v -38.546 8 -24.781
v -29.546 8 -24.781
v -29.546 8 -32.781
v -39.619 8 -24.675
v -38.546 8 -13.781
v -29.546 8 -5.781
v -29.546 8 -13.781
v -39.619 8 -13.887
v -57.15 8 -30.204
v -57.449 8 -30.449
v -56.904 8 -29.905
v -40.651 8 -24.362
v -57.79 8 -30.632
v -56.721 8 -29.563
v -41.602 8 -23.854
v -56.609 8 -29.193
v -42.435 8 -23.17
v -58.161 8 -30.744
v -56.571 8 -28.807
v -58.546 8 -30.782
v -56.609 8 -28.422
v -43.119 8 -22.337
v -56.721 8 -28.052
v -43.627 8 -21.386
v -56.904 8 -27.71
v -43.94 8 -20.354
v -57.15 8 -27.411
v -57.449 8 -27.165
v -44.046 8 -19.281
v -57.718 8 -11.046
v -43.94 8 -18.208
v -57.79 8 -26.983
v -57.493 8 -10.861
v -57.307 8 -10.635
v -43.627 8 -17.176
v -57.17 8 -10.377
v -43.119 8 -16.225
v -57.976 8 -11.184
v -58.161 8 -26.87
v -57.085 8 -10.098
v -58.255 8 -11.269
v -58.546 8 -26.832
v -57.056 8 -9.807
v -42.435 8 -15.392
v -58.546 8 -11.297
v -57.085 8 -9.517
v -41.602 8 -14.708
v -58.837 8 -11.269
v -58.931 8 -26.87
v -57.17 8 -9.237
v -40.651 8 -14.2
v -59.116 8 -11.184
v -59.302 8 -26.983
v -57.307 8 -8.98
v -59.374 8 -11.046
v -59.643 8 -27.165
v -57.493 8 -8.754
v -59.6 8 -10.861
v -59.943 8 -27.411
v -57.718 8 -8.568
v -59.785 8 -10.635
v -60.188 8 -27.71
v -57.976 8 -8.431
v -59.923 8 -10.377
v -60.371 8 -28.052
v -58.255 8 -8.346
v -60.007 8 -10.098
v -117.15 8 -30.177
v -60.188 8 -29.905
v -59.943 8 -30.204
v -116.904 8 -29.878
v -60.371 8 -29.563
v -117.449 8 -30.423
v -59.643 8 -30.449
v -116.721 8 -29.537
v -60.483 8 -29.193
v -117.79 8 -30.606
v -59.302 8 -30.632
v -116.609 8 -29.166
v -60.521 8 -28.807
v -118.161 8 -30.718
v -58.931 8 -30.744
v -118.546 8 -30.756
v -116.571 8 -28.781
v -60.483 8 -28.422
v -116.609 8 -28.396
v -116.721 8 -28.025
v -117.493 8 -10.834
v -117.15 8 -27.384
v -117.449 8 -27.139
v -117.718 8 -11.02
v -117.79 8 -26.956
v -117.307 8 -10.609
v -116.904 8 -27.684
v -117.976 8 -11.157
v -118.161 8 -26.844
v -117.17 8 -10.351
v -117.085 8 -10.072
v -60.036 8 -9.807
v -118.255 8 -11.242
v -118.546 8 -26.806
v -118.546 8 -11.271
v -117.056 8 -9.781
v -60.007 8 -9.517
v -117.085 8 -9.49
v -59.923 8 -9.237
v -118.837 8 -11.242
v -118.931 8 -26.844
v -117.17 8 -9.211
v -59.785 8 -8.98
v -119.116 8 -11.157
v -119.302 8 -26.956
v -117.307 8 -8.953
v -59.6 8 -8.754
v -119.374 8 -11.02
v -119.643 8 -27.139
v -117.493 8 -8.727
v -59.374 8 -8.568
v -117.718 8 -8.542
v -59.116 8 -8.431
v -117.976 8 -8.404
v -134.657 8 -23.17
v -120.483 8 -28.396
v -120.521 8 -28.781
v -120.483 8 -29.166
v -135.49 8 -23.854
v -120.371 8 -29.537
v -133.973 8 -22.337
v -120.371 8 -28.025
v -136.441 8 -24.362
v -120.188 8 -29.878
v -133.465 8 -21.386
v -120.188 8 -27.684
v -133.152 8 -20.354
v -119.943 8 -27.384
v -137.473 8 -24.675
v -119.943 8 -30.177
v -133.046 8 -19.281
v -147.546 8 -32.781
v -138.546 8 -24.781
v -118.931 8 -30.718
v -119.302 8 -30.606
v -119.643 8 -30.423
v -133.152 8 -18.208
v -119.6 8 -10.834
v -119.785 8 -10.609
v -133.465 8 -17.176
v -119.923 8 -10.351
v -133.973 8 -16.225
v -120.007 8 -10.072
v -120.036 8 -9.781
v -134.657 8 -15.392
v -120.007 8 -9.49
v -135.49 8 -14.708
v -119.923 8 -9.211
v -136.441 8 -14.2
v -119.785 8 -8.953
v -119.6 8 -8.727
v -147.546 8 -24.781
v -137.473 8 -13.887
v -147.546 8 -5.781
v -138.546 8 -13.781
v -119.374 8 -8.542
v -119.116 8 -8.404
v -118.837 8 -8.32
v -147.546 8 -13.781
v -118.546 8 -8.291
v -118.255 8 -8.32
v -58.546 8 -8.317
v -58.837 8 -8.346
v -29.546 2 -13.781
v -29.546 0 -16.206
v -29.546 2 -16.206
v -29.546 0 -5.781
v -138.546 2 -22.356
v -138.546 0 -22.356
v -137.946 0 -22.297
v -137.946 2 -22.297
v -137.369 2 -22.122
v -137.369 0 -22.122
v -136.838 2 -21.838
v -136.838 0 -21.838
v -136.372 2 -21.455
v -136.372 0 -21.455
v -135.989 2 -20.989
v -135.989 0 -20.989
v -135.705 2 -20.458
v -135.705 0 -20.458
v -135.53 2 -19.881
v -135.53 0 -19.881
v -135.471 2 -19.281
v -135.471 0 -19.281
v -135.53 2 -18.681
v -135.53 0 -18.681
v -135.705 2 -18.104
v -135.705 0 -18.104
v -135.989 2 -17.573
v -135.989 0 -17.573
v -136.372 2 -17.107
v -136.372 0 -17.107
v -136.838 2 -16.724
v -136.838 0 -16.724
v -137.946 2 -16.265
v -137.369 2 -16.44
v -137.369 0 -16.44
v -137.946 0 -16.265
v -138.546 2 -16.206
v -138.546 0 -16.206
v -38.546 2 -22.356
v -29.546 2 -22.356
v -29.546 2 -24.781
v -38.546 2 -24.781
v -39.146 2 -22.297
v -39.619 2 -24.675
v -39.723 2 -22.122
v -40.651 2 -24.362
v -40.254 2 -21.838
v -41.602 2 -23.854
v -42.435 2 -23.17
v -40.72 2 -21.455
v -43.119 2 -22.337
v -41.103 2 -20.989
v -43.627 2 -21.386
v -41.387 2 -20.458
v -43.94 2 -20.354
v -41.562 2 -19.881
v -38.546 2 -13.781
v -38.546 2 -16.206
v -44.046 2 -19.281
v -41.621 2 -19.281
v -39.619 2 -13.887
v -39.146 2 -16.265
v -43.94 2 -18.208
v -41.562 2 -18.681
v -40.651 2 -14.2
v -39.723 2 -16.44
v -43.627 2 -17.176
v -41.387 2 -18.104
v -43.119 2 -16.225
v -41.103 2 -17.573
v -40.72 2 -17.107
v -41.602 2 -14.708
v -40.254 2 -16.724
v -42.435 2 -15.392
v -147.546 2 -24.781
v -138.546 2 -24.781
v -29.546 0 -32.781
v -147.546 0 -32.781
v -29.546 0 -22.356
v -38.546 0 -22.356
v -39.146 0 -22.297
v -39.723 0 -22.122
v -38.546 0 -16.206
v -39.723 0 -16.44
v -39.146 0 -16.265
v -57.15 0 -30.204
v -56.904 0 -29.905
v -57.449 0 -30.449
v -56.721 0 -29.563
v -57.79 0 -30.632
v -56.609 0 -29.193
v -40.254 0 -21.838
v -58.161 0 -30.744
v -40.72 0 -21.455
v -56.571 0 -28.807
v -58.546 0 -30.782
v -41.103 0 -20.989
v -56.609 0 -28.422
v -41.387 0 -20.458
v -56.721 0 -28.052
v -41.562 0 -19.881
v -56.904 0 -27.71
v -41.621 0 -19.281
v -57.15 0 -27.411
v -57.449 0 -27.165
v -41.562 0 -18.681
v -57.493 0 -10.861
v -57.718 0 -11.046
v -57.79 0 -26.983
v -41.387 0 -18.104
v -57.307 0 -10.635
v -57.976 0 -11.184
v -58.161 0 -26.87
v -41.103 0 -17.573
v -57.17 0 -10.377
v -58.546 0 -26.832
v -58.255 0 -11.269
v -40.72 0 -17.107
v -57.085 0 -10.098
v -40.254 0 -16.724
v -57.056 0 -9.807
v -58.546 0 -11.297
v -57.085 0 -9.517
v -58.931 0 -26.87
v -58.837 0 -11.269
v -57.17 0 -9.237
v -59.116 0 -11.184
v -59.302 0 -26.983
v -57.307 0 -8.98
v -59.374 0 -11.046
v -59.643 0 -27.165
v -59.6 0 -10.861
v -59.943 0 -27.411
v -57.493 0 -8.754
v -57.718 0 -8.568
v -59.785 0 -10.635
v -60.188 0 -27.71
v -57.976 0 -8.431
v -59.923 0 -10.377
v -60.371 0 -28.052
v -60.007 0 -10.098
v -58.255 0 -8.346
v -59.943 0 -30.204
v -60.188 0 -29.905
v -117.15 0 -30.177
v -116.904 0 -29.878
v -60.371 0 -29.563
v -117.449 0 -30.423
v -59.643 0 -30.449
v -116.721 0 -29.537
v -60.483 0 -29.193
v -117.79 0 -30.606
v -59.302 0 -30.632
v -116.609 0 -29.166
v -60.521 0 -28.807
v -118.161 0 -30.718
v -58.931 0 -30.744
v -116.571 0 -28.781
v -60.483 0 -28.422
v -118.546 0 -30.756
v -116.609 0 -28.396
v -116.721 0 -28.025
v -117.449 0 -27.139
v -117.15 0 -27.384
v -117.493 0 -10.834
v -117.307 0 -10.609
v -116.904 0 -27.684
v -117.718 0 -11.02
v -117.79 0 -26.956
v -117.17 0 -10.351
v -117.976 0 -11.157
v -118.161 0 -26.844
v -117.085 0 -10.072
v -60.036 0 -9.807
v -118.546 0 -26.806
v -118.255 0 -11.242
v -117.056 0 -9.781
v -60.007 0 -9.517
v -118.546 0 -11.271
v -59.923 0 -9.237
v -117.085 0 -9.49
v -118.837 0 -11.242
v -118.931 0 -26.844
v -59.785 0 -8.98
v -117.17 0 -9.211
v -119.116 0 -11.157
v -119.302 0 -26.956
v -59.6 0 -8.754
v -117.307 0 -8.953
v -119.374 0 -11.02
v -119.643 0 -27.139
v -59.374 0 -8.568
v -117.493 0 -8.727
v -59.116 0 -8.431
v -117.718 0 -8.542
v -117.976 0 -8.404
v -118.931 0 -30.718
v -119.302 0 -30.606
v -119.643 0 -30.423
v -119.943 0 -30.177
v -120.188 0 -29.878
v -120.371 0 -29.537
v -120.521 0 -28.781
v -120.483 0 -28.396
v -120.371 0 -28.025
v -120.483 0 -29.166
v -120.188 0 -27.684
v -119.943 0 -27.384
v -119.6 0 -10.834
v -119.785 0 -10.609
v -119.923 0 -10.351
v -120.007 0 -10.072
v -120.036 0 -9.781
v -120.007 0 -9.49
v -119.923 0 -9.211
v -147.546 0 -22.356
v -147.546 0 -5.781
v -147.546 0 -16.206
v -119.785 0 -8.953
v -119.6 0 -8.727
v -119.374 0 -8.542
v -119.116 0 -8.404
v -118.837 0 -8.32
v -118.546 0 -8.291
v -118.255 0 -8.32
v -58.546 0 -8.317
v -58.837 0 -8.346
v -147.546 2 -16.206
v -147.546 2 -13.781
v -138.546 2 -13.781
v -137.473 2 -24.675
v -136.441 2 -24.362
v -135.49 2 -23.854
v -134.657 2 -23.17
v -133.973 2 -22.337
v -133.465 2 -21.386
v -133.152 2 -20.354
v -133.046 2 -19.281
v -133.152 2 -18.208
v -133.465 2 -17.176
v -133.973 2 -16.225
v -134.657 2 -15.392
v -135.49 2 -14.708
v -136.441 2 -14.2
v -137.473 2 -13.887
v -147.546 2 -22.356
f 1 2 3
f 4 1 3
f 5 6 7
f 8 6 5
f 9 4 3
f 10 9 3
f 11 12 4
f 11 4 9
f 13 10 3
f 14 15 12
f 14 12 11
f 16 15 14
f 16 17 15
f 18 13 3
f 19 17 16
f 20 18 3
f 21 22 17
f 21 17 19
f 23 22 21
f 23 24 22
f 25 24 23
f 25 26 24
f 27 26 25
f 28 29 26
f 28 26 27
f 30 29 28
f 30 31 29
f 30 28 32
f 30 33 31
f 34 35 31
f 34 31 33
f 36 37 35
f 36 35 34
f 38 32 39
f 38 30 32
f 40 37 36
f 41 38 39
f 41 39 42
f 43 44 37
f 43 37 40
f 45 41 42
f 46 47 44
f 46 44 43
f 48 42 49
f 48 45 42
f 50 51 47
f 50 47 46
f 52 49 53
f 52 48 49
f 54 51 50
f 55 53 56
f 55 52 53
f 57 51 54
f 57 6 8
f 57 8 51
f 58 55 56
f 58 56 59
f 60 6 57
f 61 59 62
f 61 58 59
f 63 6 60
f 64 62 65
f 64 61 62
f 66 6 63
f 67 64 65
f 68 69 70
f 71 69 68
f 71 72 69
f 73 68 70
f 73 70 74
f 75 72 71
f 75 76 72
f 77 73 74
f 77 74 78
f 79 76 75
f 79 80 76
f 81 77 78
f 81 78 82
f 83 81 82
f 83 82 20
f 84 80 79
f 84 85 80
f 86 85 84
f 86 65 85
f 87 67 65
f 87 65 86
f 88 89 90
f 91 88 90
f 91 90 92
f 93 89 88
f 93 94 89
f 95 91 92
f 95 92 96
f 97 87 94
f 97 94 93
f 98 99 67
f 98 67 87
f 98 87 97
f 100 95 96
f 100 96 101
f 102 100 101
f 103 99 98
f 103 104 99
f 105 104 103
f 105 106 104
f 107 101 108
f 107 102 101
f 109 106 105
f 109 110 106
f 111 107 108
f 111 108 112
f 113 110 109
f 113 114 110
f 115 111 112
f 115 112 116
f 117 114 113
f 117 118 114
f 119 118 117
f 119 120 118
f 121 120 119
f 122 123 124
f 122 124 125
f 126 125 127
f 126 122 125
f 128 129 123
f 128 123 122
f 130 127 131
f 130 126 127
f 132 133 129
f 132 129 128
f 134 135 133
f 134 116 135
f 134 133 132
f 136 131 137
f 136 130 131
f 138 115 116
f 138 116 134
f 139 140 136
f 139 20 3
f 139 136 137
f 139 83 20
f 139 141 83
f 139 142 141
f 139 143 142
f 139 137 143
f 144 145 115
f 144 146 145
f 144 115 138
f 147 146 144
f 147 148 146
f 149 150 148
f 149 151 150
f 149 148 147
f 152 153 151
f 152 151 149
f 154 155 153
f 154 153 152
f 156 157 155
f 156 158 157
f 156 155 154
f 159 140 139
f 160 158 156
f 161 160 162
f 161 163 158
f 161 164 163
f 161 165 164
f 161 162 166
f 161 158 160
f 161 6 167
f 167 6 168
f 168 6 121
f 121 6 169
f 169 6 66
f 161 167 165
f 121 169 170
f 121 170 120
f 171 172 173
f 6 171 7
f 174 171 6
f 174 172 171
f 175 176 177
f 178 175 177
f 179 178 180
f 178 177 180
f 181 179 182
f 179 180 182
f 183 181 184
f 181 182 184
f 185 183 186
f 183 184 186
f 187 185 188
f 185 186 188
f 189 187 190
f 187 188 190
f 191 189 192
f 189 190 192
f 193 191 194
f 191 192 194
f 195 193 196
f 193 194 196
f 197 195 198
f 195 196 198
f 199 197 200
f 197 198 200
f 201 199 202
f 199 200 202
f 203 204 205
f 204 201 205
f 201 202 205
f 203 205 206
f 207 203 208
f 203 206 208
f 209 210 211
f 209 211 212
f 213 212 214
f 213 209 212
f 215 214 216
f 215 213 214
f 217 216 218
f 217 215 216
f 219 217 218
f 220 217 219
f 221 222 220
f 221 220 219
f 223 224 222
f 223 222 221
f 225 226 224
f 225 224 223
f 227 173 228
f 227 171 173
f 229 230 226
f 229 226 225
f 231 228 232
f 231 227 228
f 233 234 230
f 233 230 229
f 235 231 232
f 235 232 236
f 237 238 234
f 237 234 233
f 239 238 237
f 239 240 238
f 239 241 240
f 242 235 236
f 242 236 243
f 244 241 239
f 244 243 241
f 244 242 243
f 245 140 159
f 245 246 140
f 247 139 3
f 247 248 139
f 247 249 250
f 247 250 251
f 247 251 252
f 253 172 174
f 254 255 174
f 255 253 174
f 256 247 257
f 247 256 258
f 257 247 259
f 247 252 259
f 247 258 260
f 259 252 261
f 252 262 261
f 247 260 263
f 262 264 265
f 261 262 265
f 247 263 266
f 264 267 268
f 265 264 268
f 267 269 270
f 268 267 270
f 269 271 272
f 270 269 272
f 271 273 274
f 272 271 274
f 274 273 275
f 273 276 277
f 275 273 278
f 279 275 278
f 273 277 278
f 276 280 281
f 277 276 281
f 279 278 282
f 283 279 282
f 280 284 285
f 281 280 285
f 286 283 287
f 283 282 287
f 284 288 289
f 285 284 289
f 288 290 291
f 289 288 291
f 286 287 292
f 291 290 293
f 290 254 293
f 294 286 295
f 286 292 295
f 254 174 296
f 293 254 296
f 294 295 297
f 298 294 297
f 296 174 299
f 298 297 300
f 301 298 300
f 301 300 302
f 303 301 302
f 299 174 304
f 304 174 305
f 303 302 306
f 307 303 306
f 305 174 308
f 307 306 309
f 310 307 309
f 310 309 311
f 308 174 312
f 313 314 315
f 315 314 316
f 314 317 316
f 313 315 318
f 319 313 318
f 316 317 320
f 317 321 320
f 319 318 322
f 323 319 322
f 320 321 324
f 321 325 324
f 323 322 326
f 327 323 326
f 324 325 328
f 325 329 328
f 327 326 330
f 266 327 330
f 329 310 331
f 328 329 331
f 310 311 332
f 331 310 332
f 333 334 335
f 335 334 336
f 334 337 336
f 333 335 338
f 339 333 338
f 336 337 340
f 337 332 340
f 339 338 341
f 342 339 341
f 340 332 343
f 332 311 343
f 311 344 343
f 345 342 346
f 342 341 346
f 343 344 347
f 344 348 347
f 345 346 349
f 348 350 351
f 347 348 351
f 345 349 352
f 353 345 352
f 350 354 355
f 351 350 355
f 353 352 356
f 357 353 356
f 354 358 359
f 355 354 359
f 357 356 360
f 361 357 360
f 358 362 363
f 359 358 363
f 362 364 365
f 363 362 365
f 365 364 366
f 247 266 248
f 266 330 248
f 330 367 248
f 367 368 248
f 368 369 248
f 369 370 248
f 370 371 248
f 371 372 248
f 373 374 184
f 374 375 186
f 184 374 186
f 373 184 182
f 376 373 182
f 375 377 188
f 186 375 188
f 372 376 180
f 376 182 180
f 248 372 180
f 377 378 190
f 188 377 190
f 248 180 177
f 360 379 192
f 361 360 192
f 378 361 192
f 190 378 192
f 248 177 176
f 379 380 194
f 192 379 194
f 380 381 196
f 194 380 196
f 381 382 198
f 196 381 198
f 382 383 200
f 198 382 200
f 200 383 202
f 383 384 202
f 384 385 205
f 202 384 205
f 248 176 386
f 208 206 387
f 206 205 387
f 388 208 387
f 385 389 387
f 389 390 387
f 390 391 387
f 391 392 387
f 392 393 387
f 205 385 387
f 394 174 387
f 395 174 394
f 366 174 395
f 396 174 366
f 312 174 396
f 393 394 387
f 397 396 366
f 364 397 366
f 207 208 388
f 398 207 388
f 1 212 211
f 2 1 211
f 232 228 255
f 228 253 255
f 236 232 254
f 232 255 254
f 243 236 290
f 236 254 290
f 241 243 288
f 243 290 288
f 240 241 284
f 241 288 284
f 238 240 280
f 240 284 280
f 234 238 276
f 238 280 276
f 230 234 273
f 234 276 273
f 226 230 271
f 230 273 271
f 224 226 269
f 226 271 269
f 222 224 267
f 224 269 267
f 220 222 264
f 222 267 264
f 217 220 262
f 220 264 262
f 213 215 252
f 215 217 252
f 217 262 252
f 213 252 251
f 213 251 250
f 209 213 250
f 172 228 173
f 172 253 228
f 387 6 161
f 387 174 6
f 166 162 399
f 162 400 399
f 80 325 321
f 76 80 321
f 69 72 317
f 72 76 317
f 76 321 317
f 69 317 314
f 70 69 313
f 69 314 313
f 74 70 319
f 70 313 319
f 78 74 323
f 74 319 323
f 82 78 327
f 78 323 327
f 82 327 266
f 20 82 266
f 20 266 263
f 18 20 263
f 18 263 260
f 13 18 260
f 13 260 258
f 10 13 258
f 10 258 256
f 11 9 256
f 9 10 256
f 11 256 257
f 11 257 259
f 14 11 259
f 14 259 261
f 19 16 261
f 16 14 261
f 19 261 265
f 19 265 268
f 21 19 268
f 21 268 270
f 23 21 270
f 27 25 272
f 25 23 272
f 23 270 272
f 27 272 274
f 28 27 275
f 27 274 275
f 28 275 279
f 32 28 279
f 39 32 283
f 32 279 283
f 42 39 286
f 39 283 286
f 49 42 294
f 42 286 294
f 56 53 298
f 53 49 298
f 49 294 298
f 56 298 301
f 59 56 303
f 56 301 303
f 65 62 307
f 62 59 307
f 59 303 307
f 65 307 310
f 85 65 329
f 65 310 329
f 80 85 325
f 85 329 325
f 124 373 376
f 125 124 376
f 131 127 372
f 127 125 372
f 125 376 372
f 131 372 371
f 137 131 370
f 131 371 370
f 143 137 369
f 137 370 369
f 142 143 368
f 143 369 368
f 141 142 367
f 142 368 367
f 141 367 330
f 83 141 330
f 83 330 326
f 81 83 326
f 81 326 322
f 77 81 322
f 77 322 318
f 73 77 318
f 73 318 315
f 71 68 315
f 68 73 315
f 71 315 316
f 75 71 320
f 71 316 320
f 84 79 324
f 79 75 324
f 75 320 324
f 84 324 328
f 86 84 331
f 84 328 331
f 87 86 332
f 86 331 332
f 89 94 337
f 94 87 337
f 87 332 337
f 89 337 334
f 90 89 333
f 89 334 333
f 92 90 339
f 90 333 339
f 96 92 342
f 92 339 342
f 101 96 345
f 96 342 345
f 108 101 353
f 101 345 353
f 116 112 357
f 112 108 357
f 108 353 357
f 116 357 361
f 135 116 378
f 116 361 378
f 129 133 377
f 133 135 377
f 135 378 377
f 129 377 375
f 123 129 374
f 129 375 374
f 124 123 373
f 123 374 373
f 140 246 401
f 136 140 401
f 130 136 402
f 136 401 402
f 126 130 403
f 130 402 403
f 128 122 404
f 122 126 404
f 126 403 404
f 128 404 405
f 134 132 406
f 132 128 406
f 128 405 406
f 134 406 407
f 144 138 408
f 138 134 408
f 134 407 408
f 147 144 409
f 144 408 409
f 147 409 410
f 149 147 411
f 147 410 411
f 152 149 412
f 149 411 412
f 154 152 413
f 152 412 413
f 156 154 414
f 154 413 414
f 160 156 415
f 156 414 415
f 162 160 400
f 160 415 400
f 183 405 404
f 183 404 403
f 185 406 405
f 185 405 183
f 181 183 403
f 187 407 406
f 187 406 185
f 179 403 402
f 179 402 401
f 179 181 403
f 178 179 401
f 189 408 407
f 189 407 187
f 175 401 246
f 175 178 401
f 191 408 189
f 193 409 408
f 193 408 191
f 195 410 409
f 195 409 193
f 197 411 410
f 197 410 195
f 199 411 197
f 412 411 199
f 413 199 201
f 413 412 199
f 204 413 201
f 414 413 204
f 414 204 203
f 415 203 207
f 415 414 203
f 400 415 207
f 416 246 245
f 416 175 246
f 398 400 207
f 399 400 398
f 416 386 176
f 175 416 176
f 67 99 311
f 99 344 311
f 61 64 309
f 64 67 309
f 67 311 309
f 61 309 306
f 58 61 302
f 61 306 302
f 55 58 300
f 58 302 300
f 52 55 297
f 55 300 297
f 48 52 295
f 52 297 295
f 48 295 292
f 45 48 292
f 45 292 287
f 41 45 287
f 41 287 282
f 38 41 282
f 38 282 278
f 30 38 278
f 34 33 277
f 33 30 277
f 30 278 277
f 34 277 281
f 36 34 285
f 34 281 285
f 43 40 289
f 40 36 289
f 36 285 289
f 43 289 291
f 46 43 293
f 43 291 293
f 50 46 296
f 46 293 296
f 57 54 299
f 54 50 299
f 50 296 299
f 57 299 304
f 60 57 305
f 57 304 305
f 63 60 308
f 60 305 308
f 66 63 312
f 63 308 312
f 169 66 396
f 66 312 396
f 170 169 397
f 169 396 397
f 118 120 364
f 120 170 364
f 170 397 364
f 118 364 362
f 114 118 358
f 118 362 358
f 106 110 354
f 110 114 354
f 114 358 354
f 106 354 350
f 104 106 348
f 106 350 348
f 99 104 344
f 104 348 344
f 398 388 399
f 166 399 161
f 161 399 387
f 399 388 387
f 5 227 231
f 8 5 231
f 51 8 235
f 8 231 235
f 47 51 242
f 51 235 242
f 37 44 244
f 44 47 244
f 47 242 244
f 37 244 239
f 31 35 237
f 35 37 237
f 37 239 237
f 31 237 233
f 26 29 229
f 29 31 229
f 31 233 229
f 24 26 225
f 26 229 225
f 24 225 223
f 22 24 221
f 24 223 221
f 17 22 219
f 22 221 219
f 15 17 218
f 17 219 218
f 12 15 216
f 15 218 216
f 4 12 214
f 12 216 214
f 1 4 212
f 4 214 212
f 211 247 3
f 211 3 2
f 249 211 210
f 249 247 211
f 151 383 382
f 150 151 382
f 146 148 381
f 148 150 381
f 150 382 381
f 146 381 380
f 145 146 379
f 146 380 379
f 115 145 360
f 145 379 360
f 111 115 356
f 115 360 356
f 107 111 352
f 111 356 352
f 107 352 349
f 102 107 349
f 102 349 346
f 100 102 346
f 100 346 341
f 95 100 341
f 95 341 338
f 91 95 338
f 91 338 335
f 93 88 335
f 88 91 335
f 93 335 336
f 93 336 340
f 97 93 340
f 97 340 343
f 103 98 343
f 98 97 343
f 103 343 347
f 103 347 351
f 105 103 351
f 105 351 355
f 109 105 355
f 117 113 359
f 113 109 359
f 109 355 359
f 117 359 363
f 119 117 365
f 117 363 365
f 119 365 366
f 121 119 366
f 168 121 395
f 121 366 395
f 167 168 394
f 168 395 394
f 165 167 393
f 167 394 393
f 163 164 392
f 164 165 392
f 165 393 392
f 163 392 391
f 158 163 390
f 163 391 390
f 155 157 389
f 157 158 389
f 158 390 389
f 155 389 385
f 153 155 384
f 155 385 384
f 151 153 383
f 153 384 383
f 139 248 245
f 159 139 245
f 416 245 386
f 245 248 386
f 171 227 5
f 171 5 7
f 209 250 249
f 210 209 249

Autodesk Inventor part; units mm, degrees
ref_plane "YZ Plane" through (0, 0, 0) normal (1, 0, 0) x (0, 1, 0)
ref_plane "XZ Plane" through (0, 0, 0) normal (0, 1, 0) x (-1, 0, 0)
ref_plane "XY Plane" through (0, 0, 0) normal (0, 0, 1) x (1, 0, 0)
sketch "Sketch1" plane through (0, 0, 0) normal (0, 1, 0) x (-1, 0, 0)
  circle A0 centre (118.5461, -28.7809) radius 1.975
  circle A1 centre (118.5461, -9.7809) radius 1.49
  arc A2 (138.5461, -13.7809) -> (138.5461, -24.7809) centre (138.5461, -19.2809) ccw
  circle A3 centre (58.5461, -28.8073) radius 1.975
  line L0 (147.5461, -32.7809) -> (29.5461, -32.7809)
  line L1 (29.5461, -5.7809) -> (147.5461, -5.7809)
  arc A4 (38.5461, -24.7809) -> (38.5461, -13.7809) centre (38.5461, -19.2809) ccw
  line L2 (29.5461, -32.7809) -> (29.5461, -5.7809)
  circle A5 centre (58.5461, -9.8073) radius 1.49
  arc A6 (138.5461, -16.2059) -> (138.5461, -22.3559) centre (138.5461, -19.2809) ccw
  arc A7 (38.5461, -22.3559) -> (38.5461, -16.2059) centre (38.5461, -19.2809) ccw
  line L3 (143.1062, -22.3559) -> (147.5461, -22.3559)
  line L4 (143.1062, -16.2059) -> (147.5461, -16.2059)
  line L5 (147.5461, -32.7809) -> (147.5461, -22.3559)
  line L6 (147.5461, -16.2059) -> (147.5461, -5.7809)
  line L7 (143.1062, -22.3559) -> (138.5461, -22.3559)
  line L8 (143.1062, -16.2059) -> (138.5461, -16.2059)
  line L9 (138.5461, -24.7809) -> (147.5461, -24.7809)
  line L10 (138.5461, -13.7809) -> (147.5461, -13.7809)
  line L11 (38.5461, -22.3559) -> (29.5461, -22.3559)
  line L12 (38.5461, -24.7809) -> (29.5461, -24.7809)
  line L13 (38.5461, -16.2059) -> (29.5461, -16.2059)
  line L14 (38.5461, -13.7809) -> (29.5461, -13.7809)
  point P0 (88.5461, -32.7809)
  point P1 (88.5461, -5.7809)
  dimension "d162" = 60
  dimension "d163" = 60
  dimension "d165" = 100
  dimension "d183" = 11
  dimension "d184" = 11
  dimension "d185" = 6.15
  dimension "d186" = 6.15
  dimension "d187" = 3.95
  dimension "d188" = 2.98
  dimension "d189" = 3.95
  dimension "d190" = 2.98
  dimension "d202" = 9
  dimension "d203" = 9
  dimension "d204" = 9
  dimension "d212" = 19
  dimension "d213" = 19
  dimension "d214" = 27
  dimension "d215" = 4
  dimension "d216" = 4
  dimension "d217" = 13.5
  dimension "d218" = 30
  dimension "d219" = 30
extrude "Extrusion13" add sketch "Sketch1" along normal blind 8 contours A2 L9 L5 L0 L2 L12 A4 L14 L1 L6 L10
extrude "Extrusion14" add sketch "Sketch1" along normal blind 2 contours L14 A4 L12 L2 L11 A7 L13
extrude "Extrusion15" add sketch "Sketch1" along normal blind 2 contours L10 L6 L4 L8 A6 L7 L3 L5 L9 A2
properties part number "Base Laser_3DPrint"
